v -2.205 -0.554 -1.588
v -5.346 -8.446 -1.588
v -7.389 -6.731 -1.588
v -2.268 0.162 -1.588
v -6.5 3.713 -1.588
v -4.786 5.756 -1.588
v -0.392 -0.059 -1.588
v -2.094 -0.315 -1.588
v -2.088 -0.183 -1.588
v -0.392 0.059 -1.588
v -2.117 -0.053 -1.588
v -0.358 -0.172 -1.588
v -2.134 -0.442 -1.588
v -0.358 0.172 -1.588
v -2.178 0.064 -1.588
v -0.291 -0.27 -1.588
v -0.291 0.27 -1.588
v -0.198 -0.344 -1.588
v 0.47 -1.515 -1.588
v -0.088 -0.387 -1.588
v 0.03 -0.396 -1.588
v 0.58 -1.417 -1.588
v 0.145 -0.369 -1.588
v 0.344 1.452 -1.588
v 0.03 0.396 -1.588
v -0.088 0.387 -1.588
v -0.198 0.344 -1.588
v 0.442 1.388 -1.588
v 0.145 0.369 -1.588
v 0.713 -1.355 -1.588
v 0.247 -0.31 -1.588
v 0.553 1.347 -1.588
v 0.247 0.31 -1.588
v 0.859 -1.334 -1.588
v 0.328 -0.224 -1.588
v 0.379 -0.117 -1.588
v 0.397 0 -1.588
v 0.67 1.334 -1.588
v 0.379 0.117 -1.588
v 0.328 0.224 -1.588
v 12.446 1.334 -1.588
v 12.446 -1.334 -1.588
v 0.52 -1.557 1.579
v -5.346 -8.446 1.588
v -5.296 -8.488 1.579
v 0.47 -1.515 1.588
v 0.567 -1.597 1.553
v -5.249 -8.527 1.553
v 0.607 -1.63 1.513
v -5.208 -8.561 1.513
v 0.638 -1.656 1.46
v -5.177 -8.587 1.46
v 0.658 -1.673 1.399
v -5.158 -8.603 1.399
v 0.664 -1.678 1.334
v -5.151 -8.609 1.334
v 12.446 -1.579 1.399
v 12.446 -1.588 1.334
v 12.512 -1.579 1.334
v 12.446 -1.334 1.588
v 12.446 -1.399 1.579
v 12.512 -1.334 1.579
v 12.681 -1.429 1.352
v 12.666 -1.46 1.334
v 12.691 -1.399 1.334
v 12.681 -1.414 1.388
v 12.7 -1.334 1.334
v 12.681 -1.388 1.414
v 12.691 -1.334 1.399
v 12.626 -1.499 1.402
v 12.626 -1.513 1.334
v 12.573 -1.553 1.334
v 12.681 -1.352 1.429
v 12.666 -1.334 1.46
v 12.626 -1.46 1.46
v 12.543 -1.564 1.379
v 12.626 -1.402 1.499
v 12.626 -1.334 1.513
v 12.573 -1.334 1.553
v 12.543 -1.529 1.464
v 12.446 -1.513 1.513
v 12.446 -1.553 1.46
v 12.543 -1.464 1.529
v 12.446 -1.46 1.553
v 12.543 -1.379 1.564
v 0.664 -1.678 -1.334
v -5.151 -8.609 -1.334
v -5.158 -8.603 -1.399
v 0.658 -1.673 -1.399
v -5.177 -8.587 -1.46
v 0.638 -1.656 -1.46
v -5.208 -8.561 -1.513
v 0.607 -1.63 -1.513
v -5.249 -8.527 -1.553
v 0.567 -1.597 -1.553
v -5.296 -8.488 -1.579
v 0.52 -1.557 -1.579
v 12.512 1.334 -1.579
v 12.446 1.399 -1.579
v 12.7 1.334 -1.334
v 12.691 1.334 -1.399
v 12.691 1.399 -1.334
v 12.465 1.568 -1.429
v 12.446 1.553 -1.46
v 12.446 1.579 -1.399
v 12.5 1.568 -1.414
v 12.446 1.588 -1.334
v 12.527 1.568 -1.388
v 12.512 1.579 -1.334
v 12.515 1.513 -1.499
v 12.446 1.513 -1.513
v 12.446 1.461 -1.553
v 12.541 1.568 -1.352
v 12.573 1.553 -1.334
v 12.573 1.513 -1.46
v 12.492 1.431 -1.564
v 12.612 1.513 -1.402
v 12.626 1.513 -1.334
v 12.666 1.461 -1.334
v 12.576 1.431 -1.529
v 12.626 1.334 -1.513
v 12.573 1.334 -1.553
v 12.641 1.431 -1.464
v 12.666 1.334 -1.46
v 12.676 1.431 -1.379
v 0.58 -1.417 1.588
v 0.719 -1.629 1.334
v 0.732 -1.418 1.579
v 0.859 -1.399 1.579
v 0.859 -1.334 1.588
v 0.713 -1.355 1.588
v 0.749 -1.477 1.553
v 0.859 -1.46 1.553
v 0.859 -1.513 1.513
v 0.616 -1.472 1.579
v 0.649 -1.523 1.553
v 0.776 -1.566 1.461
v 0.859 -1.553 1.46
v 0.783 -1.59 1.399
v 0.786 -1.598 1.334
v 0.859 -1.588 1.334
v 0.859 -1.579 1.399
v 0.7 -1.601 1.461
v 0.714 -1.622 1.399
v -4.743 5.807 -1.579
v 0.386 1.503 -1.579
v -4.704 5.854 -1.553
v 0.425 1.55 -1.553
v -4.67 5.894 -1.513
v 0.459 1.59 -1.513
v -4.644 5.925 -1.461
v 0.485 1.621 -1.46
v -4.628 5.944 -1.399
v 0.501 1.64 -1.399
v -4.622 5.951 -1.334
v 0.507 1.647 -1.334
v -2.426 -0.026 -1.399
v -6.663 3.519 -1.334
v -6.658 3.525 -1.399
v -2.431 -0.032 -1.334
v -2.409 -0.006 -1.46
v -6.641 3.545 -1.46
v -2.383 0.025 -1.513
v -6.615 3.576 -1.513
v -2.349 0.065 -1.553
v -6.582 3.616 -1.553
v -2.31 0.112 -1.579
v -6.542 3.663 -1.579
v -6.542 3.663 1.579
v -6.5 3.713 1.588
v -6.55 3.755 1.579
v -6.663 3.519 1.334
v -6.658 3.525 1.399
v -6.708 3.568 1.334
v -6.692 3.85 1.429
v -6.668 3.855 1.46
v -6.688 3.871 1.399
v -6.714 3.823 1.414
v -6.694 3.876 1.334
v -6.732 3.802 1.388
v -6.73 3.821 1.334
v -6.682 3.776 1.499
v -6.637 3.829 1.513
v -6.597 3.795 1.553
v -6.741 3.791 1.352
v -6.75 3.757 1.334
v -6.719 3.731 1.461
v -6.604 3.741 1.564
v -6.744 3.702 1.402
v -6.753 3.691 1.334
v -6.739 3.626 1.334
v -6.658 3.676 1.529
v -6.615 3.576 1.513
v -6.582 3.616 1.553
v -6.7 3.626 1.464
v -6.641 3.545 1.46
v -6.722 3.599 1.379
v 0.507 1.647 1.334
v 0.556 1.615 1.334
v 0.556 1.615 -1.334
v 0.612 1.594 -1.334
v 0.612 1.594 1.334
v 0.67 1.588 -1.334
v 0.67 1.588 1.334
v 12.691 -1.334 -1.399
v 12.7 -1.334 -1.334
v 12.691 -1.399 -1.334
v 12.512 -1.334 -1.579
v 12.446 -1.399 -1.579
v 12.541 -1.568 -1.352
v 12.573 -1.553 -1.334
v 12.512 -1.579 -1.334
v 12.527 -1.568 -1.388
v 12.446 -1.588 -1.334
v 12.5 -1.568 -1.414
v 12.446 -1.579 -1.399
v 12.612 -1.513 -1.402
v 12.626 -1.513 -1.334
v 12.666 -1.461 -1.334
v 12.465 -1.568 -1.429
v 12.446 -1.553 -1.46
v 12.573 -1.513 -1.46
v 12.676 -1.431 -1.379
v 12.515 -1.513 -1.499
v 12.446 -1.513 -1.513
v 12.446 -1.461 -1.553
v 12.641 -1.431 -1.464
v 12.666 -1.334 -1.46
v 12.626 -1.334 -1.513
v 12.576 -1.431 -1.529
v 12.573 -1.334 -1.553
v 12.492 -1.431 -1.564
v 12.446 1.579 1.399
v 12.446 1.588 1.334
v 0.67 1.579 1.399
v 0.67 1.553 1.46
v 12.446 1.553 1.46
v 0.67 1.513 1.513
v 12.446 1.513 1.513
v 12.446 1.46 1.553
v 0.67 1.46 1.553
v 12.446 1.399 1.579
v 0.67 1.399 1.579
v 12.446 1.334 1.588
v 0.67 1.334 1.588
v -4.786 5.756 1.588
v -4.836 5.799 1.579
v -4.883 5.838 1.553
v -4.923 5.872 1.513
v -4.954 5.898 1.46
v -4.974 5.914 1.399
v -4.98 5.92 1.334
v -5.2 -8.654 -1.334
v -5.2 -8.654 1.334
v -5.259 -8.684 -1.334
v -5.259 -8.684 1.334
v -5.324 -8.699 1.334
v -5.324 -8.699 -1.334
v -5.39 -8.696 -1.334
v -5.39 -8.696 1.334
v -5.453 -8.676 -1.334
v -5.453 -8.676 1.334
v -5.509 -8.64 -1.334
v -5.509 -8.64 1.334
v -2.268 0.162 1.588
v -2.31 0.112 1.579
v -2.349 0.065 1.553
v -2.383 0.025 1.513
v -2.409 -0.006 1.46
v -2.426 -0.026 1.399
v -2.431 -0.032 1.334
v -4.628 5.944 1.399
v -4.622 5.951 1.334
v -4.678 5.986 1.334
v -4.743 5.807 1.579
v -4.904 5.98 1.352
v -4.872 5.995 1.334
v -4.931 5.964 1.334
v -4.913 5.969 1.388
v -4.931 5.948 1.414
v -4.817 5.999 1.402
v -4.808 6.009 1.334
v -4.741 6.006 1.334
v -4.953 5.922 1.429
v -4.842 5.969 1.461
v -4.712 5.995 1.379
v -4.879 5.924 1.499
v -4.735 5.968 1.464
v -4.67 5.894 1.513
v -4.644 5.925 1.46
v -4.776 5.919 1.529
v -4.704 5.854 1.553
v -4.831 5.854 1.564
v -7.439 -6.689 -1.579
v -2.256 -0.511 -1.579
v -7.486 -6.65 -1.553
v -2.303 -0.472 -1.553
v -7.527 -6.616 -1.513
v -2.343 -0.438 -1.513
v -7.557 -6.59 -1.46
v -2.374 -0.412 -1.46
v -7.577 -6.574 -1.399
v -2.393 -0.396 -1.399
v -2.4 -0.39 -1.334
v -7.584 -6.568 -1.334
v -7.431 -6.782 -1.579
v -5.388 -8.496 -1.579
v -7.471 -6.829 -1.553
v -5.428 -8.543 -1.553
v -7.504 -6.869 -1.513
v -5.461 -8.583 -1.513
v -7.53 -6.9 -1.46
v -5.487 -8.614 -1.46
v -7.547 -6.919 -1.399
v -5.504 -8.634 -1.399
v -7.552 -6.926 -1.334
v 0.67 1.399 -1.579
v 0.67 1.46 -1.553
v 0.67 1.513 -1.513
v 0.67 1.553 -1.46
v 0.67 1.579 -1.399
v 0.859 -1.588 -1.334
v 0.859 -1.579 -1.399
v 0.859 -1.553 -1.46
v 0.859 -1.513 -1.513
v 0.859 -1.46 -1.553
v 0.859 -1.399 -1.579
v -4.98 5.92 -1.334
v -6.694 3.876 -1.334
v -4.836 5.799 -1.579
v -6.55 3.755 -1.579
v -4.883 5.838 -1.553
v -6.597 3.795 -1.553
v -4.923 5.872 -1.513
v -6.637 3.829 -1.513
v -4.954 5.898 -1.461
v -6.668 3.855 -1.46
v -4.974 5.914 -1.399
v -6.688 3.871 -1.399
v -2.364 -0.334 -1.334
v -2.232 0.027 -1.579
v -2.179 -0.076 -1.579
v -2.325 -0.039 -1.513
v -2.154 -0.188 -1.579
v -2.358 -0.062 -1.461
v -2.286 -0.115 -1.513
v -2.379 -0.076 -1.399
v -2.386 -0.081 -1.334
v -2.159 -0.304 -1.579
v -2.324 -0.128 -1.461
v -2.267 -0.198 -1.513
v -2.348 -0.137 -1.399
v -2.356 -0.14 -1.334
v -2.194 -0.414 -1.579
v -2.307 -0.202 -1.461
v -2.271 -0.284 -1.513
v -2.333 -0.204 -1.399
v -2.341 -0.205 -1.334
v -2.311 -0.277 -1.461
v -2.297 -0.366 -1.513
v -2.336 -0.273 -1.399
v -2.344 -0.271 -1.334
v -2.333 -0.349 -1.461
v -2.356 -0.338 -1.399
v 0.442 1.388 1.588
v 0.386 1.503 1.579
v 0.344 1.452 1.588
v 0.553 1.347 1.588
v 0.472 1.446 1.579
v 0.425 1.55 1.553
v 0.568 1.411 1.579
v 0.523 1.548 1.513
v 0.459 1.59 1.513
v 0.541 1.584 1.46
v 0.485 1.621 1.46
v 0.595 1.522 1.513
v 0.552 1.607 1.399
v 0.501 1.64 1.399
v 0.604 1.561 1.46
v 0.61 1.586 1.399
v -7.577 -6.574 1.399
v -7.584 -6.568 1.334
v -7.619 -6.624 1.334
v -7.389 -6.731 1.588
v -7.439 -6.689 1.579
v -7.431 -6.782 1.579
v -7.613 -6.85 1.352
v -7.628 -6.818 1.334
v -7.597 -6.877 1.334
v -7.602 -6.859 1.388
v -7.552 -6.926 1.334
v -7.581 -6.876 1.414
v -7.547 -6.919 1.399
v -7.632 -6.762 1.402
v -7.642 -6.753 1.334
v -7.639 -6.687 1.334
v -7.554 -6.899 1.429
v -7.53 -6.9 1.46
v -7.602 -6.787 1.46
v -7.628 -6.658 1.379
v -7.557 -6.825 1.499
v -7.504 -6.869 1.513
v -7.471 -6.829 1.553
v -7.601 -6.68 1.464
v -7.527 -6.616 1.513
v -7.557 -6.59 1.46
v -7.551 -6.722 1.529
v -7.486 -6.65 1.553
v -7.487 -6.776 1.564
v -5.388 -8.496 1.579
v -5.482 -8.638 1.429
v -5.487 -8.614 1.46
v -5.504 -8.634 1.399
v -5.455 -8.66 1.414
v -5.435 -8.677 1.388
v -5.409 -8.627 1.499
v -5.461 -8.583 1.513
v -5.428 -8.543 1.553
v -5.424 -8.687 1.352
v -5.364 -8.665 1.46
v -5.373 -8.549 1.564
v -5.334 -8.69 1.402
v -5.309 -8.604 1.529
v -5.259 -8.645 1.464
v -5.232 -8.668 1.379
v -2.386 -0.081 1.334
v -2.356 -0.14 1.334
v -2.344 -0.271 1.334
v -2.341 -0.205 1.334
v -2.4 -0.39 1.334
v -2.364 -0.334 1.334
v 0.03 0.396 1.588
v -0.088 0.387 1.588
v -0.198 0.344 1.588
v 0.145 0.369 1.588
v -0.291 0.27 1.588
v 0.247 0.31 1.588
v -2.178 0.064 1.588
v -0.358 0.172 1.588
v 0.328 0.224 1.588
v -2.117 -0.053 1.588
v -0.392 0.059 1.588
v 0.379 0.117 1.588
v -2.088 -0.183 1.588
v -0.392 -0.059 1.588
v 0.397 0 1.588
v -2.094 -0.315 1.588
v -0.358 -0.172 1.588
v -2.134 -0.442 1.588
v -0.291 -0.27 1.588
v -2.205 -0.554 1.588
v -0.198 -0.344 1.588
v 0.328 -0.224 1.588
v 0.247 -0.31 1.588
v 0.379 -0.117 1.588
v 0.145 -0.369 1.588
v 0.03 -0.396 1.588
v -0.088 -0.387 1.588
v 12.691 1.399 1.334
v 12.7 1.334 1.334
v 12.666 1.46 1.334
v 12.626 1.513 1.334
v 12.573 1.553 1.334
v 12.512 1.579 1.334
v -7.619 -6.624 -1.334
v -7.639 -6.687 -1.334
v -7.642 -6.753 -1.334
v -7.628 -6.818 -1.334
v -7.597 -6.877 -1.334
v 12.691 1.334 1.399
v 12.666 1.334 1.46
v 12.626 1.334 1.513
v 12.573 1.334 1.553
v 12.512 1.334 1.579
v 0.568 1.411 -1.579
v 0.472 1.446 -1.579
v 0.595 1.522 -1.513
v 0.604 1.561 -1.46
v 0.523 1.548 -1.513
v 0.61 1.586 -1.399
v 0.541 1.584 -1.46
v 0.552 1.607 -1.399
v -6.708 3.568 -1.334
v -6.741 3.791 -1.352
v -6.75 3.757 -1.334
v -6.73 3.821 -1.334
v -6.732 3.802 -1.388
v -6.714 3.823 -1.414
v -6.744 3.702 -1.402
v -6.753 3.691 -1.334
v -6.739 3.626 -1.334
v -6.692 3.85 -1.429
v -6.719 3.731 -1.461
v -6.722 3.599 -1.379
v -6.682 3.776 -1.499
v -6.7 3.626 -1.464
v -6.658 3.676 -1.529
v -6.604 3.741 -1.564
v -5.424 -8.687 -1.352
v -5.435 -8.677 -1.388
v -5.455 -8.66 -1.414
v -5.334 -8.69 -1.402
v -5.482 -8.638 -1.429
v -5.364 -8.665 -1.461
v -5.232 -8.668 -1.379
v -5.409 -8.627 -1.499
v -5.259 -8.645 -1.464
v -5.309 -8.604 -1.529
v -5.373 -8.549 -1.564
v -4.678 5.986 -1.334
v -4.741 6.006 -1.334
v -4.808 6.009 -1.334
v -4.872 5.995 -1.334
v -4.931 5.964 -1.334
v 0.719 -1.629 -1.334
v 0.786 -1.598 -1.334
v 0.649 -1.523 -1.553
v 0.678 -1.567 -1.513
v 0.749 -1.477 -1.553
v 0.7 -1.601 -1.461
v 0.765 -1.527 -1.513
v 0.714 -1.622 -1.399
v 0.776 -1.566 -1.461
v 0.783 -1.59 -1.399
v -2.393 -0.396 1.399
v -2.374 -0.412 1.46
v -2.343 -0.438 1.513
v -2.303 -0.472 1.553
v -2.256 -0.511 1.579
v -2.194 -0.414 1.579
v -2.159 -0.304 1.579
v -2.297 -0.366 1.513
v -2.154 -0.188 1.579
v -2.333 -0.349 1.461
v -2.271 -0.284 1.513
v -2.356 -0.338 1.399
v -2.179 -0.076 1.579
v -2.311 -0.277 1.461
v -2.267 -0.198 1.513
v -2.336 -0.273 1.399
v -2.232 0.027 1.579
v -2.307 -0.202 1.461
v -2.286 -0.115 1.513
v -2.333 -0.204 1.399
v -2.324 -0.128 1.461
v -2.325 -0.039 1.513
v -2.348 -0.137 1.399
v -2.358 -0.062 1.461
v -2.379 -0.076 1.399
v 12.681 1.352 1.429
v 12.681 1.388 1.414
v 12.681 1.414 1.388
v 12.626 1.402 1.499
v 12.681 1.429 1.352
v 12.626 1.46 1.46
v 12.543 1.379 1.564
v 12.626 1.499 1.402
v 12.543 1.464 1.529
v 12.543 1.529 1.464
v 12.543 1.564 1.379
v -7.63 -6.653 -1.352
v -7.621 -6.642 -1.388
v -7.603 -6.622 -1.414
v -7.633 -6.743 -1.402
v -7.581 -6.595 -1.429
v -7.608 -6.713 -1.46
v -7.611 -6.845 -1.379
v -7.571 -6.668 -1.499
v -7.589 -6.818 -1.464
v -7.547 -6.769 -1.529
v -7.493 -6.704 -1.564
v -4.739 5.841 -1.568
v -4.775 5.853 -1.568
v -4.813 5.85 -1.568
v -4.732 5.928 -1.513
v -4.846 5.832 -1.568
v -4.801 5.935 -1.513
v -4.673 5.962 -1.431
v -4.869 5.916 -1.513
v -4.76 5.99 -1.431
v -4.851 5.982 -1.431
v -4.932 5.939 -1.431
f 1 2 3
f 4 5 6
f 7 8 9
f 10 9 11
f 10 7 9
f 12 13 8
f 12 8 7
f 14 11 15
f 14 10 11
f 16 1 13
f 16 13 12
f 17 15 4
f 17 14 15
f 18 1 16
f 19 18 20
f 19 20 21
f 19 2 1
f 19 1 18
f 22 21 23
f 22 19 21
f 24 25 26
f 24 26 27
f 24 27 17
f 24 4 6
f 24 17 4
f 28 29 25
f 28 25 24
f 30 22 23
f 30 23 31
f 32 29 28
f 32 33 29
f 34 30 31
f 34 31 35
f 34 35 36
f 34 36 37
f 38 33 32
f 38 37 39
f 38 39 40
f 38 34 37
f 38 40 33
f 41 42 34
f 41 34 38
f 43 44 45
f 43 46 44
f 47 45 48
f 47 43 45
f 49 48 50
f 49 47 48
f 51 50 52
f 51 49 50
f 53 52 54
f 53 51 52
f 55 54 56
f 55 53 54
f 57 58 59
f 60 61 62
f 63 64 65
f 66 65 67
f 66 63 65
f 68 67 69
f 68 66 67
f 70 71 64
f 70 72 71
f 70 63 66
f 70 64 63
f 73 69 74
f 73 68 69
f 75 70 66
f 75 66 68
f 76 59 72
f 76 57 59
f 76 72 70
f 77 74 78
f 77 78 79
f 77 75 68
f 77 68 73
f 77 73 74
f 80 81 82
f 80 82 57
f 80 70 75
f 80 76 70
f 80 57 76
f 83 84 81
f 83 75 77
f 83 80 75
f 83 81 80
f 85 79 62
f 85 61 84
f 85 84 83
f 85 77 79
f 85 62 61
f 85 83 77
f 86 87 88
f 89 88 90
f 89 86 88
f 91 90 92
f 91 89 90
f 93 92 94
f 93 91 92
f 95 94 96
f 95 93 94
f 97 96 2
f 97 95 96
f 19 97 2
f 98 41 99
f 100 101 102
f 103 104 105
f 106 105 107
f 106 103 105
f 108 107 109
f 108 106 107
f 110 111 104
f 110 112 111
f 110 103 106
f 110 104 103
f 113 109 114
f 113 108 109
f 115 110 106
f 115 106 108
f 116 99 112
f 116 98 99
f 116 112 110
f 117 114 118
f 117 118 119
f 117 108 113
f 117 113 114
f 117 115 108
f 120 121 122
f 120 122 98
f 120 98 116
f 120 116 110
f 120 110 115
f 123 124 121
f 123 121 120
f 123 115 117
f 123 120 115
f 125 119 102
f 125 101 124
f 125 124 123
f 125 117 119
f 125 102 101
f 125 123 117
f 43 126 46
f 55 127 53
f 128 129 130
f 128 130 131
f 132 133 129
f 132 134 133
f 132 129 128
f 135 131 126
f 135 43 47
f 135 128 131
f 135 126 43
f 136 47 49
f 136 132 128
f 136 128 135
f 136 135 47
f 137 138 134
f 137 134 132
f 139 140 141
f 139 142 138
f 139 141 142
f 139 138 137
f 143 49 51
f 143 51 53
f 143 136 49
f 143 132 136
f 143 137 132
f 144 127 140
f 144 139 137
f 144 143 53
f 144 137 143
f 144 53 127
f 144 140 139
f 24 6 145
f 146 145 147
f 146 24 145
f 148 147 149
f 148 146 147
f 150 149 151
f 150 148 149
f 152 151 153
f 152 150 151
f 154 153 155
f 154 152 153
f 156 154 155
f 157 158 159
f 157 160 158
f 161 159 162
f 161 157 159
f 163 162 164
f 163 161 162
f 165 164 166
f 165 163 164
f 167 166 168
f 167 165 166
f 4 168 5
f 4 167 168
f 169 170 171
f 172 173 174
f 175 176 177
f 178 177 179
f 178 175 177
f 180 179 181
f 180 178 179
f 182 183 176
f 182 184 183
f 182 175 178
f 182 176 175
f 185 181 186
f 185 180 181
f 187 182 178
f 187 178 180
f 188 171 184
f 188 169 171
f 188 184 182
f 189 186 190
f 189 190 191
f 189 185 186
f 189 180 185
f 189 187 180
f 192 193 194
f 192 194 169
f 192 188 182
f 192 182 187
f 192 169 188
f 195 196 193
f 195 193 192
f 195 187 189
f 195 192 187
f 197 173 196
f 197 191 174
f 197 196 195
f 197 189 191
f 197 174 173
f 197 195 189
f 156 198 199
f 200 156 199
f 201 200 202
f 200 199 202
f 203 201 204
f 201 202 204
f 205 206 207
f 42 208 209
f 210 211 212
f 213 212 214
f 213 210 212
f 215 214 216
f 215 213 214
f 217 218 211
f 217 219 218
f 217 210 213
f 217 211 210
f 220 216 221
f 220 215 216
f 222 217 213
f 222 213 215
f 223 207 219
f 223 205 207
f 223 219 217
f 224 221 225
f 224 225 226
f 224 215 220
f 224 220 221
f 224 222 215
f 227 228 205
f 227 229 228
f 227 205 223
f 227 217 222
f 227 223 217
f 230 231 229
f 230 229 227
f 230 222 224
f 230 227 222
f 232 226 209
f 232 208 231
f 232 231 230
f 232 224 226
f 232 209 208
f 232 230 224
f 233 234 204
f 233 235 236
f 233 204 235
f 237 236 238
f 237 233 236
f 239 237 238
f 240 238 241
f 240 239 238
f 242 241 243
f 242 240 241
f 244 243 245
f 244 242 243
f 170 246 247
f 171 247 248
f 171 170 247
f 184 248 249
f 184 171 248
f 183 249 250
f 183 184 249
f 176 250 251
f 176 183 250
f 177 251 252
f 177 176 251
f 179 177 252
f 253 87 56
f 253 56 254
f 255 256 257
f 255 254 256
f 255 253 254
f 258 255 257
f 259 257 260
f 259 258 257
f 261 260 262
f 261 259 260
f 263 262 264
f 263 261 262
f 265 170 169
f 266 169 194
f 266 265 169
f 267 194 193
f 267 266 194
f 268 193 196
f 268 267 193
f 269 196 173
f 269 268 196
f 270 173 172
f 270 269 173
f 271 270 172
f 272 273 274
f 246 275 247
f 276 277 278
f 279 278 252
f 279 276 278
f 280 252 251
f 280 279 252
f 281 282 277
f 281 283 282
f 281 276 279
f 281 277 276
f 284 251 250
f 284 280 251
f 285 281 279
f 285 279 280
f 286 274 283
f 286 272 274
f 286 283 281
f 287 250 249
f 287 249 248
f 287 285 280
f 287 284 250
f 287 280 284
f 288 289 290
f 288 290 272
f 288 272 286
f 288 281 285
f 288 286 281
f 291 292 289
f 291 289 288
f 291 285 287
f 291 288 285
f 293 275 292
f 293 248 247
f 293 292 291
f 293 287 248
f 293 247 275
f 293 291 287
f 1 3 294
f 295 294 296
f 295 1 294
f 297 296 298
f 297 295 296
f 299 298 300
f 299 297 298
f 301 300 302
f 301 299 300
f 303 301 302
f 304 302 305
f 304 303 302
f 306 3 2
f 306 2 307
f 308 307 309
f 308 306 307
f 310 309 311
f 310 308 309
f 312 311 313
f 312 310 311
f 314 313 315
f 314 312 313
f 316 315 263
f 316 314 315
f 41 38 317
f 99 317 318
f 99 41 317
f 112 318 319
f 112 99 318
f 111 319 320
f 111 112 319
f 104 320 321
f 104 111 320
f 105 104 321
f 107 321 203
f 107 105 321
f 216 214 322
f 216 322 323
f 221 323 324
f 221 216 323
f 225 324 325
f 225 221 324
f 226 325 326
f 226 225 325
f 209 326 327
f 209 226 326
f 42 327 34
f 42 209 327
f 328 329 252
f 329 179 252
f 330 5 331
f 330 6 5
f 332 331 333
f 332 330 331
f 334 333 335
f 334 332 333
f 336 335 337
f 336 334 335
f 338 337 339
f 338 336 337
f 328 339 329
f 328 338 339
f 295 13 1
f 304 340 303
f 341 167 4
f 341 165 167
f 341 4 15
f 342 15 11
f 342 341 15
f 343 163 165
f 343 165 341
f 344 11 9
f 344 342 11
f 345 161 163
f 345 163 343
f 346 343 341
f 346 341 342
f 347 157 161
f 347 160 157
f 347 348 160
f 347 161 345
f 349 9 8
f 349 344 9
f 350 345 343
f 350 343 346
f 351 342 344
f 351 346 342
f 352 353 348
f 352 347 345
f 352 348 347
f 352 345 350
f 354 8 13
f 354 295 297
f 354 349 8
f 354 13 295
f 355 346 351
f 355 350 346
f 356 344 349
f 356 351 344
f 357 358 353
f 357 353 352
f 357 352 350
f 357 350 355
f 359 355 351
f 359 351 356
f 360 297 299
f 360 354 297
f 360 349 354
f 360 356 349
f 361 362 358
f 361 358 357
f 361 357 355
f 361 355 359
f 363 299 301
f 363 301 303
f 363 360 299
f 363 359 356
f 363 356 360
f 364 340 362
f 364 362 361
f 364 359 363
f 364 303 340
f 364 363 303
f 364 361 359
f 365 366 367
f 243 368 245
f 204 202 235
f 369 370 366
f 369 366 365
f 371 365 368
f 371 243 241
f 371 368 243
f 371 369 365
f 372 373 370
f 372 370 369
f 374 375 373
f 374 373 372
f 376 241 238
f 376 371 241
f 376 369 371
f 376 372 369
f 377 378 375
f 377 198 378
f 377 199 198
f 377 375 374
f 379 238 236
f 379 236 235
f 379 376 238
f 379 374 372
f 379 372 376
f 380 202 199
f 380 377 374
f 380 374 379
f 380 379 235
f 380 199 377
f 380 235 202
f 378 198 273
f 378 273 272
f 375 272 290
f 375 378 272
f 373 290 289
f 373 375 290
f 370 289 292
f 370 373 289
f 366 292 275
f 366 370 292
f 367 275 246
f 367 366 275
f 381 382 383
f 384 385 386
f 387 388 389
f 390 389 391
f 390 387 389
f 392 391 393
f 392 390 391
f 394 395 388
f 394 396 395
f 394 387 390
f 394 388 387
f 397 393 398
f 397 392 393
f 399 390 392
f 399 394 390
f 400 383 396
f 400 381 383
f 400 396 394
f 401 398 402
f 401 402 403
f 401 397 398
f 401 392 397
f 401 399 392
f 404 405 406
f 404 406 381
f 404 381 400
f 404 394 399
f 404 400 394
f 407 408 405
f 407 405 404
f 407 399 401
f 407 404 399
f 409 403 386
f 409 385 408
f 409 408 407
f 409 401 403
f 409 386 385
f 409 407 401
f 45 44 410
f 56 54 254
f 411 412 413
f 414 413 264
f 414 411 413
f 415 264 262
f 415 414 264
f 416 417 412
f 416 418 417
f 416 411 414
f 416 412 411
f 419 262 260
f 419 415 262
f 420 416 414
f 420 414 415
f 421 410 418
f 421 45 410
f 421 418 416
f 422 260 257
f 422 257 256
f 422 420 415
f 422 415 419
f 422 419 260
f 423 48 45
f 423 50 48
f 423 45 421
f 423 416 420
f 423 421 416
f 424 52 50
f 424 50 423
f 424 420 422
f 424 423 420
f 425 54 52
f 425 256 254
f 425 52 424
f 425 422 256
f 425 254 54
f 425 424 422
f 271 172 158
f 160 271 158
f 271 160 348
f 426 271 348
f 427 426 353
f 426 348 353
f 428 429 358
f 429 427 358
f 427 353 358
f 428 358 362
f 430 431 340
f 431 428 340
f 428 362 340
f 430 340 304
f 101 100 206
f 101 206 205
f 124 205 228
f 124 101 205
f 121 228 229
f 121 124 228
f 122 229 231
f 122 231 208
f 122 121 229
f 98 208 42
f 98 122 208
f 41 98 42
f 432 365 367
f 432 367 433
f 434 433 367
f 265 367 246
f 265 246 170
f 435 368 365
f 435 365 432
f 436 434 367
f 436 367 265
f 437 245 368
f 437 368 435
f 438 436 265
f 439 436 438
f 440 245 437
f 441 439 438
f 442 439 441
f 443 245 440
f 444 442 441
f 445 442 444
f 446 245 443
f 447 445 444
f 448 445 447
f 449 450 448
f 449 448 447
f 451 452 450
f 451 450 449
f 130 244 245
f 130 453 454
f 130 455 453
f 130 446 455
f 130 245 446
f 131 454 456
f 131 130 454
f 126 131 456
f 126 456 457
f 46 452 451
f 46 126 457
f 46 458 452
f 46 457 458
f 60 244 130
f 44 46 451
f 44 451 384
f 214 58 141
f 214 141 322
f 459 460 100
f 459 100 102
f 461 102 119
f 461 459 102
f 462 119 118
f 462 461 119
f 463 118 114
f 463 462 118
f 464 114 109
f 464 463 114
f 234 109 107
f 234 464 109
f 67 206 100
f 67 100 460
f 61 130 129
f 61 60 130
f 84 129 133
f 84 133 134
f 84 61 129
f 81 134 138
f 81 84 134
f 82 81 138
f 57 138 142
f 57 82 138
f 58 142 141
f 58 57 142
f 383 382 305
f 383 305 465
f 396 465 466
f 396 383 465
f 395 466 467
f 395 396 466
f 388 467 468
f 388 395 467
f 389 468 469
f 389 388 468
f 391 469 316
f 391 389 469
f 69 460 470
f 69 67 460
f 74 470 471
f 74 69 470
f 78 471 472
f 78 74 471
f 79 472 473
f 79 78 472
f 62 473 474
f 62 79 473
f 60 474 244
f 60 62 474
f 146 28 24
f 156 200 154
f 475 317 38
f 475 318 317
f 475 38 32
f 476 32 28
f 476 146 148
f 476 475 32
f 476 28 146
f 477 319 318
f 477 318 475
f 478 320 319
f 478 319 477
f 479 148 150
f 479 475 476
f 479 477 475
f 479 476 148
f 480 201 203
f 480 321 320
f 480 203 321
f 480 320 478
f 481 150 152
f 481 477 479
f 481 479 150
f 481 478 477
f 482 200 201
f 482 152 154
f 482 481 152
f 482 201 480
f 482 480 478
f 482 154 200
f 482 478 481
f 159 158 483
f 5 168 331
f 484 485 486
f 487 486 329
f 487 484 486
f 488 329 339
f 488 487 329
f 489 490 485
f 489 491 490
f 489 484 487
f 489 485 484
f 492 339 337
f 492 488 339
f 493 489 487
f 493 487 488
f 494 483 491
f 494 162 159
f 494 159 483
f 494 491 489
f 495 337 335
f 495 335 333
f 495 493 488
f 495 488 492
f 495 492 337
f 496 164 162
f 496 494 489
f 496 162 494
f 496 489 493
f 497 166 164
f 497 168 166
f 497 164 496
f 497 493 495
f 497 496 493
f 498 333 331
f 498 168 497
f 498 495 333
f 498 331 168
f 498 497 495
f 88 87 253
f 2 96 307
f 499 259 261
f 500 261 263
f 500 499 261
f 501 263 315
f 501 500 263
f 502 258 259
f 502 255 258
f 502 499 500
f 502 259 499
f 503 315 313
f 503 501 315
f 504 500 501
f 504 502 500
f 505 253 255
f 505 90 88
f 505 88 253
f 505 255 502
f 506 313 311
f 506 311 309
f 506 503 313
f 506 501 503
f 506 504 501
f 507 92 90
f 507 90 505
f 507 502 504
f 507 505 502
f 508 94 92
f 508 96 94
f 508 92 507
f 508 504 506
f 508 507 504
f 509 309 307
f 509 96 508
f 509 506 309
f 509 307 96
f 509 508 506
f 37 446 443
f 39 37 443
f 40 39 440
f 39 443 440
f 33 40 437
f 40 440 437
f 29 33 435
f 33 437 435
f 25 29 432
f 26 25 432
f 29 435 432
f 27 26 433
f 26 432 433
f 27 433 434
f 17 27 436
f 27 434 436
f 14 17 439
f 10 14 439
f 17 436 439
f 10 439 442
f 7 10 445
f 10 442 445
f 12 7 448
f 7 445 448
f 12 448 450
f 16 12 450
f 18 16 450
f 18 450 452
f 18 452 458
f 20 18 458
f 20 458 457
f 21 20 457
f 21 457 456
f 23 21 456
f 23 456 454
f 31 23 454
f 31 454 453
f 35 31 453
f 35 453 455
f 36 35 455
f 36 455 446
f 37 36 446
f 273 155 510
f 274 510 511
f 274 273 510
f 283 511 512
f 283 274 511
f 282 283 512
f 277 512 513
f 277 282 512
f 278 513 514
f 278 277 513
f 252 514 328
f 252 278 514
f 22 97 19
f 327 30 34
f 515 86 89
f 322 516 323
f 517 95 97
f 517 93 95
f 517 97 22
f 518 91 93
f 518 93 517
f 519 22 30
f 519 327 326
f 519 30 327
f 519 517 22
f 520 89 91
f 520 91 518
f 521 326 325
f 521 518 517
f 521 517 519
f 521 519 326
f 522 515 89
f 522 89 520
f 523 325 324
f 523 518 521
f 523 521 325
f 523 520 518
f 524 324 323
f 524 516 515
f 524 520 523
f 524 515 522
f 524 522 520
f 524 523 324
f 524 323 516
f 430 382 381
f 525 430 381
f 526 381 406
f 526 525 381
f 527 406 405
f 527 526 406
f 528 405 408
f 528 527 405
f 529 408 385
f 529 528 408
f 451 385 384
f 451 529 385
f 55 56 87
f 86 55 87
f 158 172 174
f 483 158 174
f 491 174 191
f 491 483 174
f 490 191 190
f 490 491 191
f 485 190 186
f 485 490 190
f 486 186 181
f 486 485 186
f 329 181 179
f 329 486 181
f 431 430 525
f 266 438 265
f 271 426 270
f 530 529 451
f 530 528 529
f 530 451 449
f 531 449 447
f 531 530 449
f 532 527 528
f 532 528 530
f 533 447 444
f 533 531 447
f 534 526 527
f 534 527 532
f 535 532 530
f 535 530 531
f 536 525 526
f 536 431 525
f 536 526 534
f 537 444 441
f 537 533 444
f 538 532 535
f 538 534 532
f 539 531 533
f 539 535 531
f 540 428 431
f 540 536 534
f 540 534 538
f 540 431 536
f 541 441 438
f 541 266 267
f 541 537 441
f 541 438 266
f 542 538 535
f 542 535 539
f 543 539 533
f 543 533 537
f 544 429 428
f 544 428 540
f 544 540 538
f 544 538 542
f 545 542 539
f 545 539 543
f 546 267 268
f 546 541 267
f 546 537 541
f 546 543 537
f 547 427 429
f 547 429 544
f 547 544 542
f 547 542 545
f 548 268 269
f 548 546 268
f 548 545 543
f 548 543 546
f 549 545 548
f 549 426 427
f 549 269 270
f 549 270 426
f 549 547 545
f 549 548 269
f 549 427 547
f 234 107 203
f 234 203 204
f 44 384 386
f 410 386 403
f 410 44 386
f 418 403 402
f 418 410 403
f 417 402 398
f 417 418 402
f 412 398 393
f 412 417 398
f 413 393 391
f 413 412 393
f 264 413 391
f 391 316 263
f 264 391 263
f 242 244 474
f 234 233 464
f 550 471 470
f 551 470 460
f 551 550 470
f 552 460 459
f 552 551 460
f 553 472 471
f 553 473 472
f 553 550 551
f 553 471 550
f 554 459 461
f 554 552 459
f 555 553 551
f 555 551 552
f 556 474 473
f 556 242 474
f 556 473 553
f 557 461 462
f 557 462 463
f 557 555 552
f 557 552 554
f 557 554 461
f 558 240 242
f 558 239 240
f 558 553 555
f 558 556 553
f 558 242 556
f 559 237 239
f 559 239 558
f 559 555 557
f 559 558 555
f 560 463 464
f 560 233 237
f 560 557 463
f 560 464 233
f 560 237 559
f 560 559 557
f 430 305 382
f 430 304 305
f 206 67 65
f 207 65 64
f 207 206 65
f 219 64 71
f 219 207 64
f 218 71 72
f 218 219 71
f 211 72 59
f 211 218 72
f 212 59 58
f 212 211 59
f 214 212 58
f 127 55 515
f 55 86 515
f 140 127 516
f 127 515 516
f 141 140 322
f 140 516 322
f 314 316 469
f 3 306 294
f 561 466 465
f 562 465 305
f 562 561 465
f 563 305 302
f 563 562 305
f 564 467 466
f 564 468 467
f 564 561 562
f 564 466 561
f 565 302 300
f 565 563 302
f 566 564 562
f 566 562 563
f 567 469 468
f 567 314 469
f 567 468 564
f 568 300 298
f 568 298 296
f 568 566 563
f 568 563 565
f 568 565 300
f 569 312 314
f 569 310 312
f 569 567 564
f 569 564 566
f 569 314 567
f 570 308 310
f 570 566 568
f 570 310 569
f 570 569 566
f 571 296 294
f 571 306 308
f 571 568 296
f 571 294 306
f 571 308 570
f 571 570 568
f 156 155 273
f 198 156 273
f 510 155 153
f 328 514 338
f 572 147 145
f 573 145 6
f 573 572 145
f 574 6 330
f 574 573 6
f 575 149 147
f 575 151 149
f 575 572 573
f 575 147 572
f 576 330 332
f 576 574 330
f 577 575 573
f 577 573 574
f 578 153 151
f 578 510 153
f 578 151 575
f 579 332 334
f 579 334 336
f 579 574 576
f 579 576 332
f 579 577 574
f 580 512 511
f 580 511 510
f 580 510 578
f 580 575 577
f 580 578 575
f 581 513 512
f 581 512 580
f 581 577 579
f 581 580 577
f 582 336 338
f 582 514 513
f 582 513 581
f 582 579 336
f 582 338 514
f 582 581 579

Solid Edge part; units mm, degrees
sketch "Sketch1" plane through (0, 0, 0) normal (0, 0, 1) x (1, 0, 0)
  line L0 (0, 0) -> (12.7, 0)
  line L1 (0, 0) -> (-5.8373, 4.898)
  dimension "D1" = 12.7
  dimension "D2" = 7.62
  dimension "D3" = 10.16
sketch "Sketch2" plane through (12.7, 0, 0) normal (1, 0, 0) x (0, 1, 0)
  line L0 (1.5875, -1.5875) -> (1.5875, 1.5875)
  line L1 (1.5875, 1.5875) -> (-1.5875, 1.5875)
  line L2 (-1.5875, 1.5875) -> (-1.5875, -1.5875)
  line L3 (-1.5875, -1.5875) -> (1.5875, -1.5875)
  dimension "D1" = 3.175
  dimension "D2" = 3.175
sweep "SweptProtrusion_1" add profiles "Sketch2" path "Sketch1"
sketch "Sketch3" plane through (0, 0, 0) normal (0, 0, 1) x (1, 0, 0)
  line L0 (0, 0) -> (12.7, 0)
  line L1 (0, 0) -> (-6.5307, -7.783)
  dimension "D1" = 12.7
  dimension "D2" = 7.62
  dimension "D3" = 10.16
sketch "Sketch4" plane through (12.7, 0, 0) normal (1, 0, 0) x (0, 1, 0)
  line L0 (-1.5875, -1.5875) -> (1.5875, -1.5875)
  line L1 (1.5875, -1.5875) -> (1.5875, 1.5875)
  line L2 (1.5875, 1.5875) -> (-1.5875, 1.5875)
  line L3 (-1.5875, 1.5875) -> (-1.5875, -1.5875)
  dimension "D1" = 3.175
  dimension "D2" = 3.175
sweep "SweptProtrusion_2" add profiles "Sketch4" path "Sketch3"
sketch "Sketch5" plane through (-2.2223, 2.052, 1.5875) normal (0, 0, 1) x (1, 0, 0)
  circle A0 centre (2.2223, -2.052) radius 0.3969
extrude "Cutout1" cut sketch "Sketch5" against normal up to next
fillet "Round_1" radius 0.254 27 edges at (6.7201, -1.5875, 1.5875) (-2.2872, -5.1955, 1.5875) (-4.9917, -3.4791, 1.5875) (-4.5471, 1.7431, 1.5875) (-2.1195, 3.8508, 1.5875) (6.6389, 1.5875, 1.5875) (12.7, 0, 1.5875) (12.7, 0, -1.5875) (12.7, -1.5875, 0) (12.7, 1.5875, 0) (6.7201, -1.5875, -1.5875) (0.7403, -1.5875, 0) (-2.2872, -5.1955, -1.5875) (-6.5307, -7.783, 1.5875) (-5.3146, -8.8034, 0) (-6.5307, -7.783, -1.5875) (-7.7468, -6.7626, 0) (-2.2365, -0.1957, 0) (-4.9917, -3.4791, -1.5875) (-4.5471, 1.7431, -1.5875) (-6.8577, 3.6819, 0) (-5.8373, 4.898, 1.5875) (-4.8168, 6.1141, 0) (-5.8373, 4.898, -1.5875) (0.5778, 1.5875, 0) (6.6389, 1.5875, -1.5875) (-2.1195, 3.8508, -1.5875)
